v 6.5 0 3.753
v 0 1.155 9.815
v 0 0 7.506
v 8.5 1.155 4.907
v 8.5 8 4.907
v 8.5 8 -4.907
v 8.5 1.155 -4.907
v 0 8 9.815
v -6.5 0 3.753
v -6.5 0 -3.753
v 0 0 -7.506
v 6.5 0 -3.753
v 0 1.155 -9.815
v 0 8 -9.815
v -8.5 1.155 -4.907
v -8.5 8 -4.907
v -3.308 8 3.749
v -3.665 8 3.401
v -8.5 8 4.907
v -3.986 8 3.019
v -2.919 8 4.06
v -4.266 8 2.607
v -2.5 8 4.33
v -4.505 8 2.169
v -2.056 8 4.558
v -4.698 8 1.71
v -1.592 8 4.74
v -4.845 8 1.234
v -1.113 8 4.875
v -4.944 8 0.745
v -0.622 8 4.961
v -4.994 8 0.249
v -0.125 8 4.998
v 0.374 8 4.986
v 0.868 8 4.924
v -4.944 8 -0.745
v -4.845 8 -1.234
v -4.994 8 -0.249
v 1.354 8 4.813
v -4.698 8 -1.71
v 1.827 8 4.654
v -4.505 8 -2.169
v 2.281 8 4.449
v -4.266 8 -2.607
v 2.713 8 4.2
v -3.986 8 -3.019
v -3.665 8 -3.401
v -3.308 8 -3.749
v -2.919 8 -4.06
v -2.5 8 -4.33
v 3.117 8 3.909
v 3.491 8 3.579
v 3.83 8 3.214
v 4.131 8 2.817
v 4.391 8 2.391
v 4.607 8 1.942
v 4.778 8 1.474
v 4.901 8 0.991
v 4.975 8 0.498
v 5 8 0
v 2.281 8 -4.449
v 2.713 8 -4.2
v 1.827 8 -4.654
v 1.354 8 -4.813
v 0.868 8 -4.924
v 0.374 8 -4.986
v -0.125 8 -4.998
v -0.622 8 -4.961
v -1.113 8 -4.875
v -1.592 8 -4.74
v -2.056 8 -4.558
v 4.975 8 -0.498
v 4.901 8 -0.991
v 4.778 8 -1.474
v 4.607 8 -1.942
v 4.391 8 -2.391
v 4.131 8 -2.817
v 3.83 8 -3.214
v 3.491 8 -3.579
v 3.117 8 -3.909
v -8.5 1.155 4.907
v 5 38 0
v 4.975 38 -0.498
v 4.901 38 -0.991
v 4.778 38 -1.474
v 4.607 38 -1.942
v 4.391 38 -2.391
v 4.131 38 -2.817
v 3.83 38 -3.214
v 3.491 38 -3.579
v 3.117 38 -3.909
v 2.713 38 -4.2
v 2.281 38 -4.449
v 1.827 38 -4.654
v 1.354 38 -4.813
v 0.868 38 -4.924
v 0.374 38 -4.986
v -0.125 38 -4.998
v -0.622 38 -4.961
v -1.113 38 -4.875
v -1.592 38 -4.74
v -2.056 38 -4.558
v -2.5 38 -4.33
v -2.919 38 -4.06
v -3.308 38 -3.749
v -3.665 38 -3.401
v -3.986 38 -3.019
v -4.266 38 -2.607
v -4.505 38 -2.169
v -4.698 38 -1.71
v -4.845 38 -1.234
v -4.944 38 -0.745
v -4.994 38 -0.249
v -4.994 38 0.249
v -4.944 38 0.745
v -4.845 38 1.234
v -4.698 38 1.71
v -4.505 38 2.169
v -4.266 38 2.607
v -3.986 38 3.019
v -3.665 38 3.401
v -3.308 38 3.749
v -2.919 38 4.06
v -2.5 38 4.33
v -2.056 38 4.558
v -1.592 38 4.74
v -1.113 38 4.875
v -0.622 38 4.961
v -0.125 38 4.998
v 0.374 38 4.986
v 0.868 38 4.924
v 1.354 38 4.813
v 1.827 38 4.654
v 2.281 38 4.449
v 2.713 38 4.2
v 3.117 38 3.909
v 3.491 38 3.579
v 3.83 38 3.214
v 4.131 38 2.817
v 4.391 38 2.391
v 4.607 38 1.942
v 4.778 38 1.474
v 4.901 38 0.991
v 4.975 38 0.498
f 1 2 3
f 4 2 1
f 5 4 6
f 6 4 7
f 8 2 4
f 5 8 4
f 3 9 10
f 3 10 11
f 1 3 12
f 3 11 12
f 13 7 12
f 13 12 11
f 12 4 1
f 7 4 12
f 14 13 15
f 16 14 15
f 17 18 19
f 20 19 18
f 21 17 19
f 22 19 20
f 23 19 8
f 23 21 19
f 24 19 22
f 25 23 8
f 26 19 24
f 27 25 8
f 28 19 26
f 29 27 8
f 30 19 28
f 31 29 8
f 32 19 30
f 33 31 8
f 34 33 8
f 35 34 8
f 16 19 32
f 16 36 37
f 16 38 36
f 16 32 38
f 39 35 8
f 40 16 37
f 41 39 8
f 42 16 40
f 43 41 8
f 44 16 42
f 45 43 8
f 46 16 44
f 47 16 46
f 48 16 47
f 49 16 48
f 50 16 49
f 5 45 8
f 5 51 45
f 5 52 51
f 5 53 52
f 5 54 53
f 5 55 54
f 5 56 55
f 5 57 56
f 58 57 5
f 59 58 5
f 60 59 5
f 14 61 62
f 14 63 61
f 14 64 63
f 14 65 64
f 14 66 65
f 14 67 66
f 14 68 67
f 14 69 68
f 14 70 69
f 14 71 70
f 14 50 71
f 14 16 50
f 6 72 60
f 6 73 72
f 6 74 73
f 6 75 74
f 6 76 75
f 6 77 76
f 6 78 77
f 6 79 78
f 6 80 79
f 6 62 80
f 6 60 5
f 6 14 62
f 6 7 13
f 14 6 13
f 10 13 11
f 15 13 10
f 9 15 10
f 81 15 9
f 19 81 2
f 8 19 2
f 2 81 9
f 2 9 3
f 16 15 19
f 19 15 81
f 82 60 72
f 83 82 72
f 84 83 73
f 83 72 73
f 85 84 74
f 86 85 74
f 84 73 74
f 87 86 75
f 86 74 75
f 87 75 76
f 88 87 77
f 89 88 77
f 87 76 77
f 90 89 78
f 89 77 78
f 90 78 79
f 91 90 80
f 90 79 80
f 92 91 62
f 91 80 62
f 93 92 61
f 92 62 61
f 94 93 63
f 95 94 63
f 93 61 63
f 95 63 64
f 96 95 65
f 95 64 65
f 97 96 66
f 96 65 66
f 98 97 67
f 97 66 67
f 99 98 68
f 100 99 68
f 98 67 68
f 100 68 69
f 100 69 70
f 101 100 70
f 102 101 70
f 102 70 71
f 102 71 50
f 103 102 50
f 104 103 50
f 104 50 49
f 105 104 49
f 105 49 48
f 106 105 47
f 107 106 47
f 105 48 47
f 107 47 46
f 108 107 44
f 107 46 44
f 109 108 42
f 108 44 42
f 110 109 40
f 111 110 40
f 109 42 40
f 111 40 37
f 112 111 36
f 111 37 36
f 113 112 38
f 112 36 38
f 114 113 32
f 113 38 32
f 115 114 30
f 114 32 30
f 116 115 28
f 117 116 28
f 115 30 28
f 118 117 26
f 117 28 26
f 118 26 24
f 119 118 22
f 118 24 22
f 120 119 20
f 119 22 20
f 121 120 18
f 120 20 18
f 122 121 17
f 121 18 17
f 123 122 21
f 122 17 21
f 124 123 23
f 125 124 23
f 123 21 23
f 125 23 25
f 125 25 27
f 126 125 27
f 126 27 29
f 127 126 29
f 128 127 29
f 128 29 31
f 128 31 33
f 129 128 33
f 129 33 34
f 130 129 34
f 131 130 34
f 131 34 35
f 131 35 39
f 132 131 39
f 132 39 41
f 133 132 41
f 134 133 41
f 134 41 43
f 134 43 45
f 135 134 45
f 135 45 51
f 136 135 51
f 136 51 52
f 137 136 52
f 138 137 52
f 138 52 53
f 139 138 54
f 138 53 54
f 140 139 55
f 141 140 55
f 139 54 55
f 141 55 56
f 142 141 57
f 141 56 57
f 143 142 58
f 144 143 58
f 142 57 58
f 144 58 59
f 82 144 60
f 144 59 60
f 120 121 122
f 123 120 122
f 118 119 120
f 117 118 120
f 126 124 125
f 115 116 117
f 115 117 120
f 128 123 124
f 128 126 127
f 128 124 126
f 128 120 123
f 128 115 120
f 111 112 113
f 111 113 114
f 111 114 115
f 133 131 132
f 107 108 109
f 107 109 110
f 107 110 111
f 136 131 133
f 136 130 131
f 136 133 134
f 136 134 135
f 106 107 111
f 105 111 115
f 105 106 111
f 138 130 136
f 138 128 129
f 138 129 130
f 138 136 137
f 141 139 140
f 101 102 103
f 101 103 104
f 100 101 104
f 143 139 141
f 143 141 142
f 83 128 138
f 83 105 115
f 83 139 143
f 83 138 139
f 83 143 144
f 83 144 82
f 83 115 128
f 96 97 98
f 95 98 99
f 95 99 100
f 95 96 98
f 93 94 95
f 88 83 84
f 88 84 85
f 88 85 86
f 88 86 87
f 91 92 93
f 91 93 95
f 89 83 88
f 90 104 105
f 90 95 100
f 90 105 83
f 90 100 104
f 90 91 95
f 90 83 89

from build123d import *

# Parameters (mm, degrees)
EXTRUDE_1_DEPTH = 8
SKETCH_2_R      = 5
EXTRUDE_2_DEPTH = 30
CHAMFER_1_SIZE  = 2
CHAMFER_1_SIZE2 = 1.154700538


with BuildPart() as part:
    # Эскиз1 → Бобышка-Вытянуть1 (new body)
    with BuildSketch(Plane(origin=(0, 0, 0), x_dir=(1, 0, 0), z_dir=(0, 1, 0))):
        Polygon((8.5, -4.907477288), (8.5, 4.907477288), (0, 9.814954576), (-8.5, 4.907477288), (-8.5, -4.907477288), (0, -9.814954576), align=None)
    extrude(amount=EXTRUDE_1_DEPTH)

    # Эскиз2 → Бобышка-Вытянуть2 (add)
    with BuildSketch(Plane(origin=(0, 8, 0), x_dir=(1, 0, 0), z_dir=(0, 1, 0))):
        Circle(SKETCH_2_R)
    extrude(amount=EXTRUDE_2_DEPTH)

    # Фаска1
    chamfer_1_edges = [part.edges().sort_by_distance(p)[0] for p in [
        (-4.25, 0, 7.361215932),
        (-8.5, 0, 0),
        (-4.25, 0, -7.361215932),
        (4.25, 0, -7.361215932),
        (8.5, 0, 0),
        (4.25, 0, 7.361215932),
    ]]
    chamfer_1_side = [part.faces().sort_by_distance(p)[0] for p in [
        (0, 0, 0),
    ]]
    chamfer(chamfer_1_edges, length=CHAMFER_1_SIZE, length2=CHAMFER_1_SIZE2, reference=chamfer_1_side[0])


solid = part.part
